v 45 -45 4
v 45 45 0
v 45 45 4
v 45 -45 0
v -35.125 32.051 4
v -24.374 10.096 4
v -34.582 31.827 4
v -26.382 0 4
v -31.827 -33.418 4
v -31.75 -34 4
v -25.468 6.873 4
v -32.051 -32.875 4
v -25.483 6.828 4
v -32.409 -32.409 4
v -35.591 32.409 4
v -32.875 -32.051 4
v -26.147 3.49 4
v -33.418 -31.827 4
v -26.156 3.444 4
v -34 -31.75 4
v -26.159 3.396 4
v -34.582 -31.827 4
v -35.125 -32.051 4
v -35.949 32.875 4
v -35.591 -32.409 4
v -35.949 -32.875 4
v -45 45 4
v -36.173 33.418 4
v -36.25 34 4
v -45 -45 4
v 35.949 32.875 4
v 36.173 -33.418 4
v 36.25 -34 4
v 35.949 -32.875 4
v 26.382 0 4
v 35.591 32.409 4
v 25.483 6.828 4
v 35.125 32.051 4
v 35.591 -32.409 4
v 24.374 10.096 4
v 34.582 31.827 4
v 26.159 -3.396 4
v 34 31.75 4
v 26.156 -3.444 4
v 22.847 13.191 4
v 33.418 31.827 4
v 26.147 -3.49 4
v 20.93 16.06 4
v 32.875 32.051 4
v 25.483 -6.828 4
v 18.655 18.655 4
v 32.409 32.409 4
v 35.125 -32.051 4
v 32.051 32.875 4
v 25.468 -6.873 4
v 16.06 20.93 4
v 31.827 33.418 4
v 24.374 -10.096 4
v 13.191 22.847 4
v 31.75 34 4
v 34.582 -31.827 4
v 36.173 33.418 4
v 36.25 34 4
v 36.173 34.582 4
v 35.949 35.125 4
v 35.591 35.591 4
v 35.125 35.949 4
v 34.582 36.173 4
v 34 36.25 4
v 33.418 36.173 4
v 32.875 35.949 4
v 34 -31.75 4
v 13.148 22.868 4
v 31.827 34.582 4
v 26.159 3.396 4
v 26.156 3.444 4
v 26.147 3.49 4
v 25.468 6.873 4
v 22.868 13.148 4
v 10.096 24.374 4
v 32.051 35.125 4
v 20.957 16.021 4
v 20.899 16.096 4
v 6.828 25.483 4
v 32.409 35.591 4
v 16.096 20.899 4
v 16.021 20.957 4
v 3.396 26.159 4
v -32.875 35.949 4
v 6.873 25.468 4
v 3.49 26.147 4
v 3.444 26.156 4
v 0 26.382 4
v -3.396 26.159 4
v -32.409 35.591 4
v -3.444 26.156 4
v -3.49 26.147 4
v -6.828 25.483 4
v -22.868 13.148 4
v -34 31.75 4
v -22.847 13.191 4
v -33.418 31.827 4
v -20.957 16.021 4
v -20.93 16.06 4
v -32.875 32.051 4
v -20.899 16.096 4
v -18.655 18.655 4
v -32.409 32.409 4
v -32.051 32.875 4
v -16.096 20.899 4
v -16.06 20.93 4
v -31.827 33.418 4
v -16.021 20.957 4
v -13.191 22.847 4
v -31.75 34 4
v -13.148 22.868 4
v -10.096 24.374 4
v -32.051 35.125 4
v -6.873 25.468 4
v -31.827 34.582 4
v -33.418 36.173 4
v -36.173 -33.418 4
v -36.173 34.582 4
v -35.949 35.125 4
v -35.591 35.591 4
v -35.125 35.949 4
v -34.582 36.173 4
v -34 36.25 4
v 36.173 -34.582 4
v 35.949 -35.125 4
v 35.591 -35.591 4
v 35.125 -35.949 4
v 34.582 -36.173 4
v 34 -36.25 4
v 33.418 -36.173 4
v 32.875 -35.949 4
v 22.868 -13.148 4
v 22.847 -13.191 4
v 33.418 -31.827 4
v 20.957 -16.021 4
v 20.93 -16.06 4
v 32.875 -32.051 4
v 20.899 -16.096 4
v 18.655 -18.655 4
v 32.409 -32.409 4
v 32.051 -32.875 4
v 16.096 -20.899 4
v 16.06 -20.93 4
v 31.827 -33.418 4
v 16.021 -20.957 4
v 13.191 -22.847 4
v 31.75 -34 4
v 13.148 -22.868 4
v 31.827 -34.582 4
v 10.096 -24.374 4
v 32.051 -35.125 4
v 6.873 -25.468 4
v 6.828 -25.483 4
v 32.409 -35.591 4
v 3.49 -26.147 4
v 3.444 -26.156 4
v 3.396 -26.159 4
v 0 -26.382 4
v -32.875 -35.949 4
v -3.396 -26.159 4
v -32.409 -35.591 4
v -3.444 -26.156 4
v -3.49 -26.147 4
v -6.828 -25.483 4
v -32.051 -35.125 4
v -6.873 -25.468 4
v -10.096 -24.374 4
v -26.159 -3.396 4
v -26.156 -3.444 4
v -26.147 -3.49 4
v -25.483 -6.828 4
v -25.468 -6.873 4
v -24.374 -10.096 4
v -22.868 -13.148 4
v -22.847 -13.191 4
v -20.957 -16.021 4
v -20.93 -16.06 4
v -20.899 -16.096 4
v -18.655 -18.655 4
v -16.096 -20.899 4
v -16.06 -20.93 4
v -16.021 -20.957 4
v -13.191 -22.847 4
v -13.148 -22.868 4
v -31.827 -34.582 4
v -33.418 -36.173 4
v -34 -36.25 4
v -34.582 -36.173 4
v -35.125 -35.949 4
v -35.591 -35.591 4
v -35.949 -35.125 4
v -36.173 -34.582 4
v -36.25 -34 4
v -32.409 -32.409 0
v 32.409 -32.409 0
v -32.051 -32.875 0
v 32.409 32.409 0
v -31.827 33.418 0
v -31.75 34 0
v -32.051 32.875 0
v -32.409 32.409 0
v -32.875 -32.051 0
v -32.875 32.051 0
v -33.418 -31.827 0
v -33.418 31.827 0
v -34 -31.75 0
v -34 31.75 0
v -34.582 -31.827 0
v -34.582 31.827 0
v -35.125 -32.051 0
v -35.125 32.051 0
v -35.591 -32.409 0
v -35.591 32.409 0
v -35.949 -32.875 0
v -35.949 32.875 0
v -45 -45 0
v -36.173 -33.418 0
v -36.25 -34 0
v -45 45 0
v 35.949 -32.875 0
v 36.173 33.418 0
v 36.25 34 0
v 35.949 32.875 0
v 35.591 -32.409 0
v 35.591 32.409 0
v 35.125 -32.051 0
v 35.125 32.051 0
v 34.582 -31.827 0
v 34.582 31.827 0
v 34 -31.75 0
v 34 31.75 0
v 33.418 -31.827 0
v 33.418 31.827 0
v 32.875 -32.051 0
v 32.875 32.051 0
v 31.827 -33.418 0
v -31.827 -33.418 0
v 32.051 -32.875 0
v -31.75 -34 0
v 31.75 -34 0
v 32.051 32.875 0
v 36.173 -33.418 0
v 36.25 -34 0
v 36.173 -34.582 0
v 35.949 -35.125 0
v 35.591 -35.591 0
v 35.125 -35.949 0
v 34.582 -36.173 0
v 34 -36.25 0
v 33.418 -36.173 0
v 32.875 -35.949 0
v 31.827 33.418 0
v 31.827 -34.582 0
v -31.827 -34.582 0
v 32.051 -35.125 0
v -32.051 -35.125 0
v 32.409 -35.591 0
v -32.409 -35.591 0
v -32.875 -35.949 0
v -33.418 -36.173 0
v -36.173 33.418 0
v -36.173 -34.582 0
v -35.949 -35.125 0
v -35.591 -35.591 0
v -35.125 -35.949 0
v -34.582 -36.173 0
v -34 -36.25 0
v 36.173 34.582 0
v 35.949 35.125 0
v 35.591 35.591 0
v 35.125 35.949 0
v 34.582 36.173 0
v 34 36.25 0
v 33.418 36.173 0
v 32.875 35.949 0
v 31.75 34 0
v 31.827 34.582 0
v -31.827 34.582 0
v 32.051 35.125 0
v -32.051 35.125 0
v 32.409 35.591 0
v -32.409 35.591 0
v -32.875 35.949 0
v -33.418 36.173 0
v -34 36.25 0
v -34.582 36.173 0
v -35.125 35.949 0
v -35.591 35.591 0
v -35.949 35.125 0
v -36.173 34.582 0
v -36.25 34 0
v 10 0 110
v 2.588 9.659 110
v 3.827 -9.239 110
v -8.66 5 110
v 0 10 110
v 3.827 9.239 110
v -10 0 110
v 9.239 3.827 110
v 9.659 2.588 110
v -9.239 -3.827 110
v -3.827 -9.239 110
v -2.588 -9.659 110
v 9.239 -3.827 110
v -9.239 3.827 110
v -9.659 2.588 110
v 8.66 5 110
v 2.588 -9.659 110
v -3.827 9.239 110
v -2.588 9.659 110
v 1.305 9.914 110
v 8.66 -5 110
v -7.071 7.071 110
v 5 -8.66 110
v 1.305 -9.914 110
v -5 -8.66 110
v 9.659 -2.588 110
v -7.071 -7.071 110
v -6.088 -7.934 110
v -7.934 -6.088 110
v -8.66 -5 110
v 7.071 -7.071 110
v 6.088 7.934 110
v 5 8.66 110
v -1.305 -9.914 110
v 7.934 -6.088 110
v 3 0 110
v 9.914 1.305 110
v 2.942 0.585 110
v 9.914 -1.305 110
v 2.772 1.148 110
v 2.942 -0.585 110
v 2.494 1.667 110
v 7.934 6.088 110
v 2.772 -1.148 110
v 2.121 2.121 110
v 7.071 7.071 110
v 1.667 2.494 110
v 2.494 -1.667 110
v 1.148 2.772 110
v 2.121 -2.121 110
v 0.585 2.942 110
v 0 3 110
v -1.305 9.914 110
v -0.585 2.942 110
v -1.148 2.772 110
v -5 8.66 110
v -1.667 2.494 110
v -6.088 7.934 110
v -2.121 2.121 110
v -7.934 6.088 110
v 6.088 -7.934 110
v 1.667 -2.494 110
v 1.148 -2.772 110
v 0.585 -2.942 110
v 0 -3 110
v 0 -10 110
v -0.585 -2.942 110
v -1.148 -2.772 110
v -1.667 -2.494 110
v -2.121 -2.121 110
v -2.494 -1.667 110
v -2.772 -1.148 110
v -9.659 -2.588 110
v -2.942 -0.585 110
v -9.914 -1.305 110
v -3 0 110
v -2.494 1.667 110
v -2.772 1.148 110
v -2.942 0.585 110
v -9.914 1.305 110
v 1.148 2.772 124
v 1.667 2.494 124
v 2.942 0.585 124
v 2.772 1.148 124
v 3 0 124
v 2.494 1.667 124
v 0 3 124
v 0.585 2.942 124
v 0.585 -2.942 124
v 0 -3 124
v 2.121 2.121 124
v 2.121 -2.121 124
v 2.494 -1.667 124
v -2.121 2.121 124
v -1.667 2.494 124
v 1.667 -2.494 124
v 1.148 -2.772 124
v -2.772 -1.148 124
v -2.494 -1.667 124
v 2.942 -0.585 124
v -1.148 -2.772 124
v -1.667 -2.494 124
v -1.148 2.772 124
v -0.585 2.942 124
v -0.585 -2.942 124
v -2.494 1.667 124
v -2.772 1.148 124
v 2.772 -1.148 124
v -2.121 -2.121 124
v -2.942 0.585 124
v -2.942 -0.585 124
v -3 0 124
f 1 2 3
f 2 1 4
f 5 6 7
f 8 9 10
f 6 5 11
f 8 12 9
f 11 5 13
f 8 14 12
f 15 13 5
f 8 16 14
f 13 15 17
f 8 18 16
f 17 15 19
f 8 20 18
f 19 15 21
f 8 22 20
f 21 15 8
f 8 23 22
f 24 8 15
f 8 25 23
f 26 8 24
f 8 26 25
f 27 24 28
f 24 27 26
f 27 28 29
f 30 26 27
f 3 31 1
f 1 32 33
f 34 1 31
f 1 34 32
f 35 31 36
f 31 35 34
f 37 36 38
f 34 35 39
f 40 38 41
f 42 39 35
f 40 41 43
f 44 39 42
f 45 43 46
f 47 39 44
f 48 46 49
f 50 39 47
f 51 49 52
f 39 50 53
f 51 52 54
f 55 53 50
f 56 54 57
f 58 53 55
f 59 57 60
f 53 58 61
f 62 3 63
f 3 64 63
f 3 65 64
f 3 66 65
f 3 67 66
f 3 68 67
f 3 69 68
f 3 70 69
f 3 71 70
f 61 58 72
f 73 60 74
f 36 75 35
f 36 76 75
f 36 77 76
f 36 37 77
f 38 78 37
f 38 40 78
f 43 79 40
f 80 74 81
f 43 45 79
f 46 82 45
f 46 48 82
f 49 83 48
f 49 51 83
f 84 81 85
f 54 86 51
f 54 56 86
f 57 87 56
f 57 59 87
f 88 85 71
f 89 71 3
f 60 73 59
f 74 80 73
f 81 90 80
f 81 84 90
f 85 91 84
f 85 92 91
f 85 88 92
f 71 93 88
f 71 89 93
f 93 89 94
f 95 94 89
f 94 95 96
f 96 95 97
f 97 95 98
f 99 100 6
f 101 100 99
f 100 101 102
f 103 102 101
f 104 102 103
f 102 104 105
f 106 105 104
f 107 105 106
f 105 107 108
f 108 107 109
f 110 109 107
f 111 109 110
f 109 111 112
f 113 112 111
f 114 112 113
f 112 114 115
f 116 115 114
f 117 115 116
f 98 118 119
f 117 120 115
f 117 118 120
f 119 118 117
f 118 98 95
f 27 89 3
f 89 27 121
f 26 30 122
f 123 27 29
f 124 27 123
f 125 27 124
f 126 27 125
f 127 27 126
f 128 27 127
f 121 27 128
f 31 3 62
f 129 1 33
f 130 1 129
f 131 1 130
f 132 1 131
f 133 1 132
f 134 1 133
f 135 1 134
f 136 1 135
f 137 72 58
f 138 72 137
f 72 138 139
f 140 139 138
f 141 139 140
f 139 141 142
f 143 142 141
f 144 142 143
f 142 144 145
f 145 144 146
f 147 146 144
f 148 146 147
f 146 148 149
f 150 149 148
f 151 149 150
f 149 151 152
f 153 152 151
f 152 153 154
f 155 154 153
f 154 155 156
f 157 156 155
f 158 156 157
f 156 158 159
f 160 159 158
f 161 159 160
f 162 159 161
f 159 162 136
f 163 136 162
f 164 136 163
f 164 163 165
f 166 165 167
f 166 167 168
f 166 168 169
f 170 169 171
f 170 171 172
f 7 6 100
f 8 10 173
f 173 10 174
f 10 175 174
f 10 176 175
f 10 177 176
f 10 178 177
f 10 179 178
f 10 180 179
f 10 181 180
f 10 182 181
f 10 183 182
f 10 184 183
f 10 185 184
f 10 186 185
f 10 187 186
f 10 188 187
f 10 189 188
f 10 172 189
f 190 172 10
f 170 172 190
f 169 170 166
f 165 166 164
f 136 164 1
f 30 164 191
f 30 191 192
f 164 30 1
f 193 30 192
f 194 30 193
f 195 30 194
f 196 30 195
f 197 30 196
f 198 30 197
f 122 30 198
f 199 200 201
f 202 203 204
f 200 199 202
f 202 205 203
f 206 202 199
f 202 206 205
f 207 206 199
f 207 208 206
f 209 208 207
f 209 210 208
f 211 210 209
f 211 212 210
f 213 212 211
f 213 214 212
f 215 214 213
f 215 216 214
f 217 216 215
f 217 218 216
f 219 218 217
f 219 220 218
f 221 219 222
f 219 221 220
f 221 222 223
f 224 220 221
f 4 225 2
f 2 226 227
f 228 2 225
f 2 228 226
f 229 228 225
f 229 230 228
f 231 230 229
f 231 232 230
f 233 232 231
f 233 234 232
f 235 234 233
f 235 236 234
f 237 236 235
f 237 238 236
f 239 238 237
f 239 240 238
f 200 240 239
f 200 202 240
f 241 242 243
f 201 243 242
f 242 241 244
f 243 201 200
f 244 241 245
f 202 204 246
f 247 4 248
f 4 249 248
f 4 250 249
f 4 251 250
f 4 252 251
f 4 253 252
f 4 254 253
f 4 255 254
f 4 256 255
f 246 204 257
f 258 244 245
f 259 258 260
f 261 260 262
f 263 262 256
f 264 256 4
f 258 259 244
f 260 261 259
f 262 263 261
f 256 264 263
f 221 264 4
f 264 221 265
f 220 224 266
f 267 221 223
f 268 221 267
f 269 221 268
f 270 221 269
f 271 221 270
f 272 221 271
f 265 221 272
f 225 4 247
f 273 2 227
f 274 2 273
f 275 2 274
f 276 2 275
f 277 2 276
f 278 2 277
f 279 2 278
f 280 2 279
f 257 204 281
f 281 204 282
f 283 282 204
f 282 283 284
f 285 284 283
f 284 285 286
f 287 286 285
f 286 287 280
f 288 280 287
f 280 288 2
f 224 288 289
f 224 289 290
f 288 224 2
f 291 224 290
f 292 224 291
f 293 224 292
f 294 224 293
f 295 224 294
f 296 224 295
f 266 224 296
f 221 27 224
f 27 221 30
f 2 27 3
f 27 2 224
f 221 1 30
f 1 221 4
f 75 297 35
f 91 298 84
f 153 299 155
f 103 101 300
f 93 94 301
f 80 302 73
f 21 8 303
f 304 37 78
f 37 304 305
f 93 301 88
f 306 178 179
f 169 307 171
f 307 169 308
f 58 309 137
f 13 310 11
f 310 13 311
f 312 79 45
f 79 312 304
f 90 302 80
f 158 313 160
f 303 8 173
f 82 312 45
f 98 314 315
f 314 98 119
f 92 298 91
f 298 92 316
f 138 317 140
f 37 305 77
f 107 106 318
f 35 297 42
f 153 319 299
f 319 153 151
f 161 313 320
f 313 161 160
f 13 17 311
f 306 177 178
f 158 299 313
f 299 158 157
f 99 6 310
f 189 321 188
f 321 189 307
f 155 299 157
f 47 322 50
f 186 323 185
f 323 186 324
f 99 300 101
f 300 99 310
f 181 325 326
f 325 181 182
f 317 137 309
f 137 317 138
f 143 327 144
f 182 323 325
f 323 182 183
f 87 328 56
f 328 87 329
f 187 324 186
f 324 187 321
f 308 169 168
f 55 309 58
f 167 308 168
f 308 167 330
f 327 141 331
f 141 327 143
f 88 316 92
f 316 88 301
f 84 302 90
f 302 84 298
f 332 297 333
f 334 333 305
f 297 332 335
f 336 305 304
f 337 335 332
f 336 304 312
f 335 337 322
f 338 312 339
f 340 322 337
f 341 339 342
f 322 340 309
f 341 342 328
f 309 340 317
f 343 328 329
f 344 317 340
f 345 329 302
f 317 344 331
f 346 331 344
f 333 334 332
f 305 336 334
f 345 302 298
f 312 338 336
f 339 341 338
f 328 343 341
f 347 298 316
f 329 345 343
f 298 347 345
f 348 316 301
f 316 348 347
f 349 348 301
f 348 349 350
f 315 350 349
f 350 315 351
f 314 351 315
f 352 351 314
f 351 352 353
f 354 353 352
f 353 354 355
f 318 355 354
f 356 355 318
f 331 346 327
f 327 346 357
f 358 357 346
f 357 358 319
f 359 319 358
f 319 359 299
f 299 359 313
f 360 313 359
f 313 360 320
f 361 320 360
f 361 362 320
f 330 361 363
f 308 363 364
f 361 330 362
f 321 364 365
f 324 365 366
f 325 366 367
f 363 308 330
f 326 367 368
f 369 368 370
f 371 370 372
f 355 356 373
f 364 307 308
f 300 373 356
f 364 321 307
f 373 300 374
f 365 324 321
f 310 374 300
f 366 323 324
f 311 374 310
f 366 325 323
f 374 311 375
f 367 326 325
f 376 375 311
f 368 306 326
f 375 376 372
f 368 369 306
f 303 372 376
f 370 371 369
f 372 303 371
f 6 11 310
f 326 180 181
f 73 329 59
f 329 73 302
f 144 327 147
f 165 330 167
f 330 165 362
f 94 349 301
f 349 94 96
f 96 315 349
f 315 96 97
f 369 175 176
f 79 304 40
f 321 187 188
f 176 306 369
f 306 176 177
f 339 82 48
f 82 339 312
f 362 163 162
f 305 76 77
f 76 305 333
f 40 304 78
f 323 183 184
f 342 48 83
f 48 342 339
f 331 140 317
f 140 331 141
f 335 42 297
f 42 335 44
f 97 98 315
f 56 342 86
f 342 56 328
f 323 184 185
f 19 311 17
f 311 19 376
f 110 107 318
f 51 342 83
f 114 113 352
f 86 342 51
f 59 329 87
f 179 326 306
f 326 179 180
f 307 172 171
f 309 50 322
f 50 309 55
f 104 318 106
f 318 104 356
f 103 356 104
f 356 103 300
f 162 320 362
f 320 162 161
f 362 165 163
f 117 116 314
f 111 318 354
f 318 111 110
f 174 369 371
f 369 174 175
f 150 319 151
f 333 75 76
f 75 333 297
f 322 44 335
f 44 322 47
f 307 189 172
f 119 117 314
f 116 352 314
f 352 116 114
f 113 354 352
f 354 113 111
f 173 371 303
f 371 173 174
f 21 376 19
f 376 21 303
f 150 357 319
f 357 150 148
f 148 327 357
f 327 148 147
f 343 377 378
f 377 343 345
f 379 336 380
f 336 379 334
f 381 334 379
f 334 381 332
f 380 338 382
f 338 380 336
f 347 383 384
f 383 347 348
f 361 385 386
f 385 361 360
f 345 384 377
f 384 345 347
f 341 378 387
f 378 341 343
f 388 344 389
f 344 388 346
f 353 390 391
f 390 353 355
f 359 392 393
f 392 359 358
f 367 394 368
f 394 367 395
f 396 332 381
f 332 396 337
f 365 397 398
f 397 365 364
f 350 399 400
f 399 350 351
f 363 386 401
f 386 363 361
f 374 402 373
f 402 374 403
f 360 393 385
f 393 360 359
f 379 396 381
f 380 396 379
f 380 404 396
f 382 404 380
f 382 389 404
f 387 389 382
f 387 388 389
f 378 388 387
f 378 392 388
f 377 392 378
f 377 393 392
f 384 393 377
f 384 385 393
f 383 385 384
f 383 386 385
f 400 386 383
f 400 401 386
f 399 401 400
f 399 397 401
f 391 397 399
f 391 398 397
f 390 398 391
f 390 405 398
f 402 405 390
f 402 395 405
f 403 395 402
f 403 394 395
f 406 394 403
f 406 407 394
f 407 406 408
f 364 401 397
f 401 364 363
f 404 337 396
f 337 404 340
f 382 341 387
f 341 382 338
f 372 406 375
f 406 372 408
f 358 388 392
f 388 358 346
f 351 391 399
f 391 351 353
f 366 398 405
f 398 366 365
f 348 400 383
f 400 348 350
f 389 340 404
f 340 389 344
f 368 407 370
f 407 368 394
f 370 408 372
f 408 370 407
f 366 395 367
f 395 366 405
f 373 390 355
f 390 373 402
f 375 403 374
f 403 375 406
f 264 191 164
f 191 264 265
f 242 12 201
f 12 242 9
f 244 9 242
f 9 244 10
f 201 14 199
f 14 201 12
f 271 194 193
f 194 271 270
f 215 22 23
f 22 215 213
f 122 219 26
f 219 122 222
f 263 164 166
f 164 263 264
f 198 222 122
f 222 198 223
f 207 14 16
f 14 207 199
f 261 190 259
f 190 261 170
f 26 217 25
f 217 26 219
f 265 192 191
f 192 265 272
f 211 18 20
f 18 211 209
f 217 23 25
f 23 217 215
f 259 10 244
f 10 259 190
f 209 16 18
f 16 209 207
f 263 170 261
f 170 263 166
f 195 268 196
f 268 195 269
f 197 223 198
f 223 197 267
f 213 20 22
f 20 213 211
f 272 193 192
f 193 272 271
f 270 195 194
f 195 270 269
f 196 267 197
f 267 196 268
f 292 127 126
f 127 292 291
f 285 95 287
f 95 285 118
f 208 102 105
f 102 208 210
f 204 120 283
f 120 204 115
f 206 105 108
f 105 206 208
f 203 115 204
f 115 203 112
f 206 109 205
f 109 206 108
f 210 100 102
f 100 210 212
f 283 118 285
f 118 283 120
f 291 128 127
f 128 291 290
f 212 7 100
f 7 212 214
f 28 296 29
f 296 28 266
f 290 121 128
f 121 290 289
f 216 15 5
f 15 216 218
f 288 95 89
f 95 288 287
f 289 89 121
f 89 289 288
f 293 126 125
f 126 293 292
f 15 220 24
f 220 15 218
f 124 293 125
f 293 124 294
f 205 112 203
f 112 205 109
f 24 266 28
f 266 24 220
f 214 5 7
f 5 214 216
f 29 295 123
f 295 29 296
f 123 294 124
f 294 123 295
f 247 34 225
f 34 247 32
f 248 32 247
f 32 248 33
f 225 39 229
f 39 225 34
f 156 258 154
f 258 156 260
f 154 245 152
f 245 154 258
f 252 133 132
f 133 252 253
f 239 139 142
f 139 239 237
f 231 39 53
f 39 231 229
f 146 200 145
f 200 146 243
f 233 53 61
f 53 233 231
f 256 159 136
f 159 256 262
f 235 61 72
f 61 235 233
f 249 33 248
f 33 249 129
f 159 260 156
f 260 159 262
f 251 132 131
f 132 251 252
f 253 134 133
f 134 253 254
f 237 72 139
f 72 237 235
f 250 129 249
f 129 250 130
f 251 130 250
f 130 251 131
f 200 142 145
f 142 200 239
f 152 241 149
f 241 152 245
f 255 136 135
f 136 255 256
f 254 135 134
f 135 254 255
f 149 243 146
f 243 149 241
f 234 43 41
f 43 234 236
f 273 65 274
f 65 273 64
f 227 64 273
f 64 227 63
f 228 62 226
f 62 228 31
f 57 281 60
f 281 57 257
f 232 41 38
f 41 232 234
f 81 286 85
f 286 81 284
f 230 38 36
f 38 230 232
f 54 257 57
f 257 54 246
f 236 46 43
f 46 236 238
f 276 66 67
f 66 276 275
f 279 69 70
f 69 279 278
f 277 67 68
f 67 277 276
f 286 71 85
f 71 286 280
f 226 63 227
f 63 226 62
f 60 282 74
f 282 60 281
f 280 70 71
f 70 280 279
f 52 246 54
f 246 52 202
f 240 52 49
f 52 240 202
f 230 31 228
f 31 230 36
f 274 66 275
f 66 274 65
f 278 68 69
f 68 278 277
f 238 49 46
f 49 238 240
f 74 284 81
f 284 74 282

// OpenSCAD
base_size=90; post_height=110; post_diameter=20; spindle_diameter=6; mount_hole_diameter=4.5;
module carousel_base(){ difference(){ union(){ translate([-base_size/2,-base_size/2,0]) cube([base_size,base_size,4]); cylinder(d1=54,d2=post_diameter,h=post_height,$fn=48); translate([0,0,post_height]) cylinder(d=spindle_diameter,h=14,$fn=32); } for(x=[-34,34],y=[-34,34]) translate([x,y,-1]) cylinder(d=mount_hole_diameter,h=7,$fn=24); }}
assert(post_height==110 && spindle_diameter==6); echo("SCADCTL_REQUIREMENT:parameters:PASS"); carousel_base();
